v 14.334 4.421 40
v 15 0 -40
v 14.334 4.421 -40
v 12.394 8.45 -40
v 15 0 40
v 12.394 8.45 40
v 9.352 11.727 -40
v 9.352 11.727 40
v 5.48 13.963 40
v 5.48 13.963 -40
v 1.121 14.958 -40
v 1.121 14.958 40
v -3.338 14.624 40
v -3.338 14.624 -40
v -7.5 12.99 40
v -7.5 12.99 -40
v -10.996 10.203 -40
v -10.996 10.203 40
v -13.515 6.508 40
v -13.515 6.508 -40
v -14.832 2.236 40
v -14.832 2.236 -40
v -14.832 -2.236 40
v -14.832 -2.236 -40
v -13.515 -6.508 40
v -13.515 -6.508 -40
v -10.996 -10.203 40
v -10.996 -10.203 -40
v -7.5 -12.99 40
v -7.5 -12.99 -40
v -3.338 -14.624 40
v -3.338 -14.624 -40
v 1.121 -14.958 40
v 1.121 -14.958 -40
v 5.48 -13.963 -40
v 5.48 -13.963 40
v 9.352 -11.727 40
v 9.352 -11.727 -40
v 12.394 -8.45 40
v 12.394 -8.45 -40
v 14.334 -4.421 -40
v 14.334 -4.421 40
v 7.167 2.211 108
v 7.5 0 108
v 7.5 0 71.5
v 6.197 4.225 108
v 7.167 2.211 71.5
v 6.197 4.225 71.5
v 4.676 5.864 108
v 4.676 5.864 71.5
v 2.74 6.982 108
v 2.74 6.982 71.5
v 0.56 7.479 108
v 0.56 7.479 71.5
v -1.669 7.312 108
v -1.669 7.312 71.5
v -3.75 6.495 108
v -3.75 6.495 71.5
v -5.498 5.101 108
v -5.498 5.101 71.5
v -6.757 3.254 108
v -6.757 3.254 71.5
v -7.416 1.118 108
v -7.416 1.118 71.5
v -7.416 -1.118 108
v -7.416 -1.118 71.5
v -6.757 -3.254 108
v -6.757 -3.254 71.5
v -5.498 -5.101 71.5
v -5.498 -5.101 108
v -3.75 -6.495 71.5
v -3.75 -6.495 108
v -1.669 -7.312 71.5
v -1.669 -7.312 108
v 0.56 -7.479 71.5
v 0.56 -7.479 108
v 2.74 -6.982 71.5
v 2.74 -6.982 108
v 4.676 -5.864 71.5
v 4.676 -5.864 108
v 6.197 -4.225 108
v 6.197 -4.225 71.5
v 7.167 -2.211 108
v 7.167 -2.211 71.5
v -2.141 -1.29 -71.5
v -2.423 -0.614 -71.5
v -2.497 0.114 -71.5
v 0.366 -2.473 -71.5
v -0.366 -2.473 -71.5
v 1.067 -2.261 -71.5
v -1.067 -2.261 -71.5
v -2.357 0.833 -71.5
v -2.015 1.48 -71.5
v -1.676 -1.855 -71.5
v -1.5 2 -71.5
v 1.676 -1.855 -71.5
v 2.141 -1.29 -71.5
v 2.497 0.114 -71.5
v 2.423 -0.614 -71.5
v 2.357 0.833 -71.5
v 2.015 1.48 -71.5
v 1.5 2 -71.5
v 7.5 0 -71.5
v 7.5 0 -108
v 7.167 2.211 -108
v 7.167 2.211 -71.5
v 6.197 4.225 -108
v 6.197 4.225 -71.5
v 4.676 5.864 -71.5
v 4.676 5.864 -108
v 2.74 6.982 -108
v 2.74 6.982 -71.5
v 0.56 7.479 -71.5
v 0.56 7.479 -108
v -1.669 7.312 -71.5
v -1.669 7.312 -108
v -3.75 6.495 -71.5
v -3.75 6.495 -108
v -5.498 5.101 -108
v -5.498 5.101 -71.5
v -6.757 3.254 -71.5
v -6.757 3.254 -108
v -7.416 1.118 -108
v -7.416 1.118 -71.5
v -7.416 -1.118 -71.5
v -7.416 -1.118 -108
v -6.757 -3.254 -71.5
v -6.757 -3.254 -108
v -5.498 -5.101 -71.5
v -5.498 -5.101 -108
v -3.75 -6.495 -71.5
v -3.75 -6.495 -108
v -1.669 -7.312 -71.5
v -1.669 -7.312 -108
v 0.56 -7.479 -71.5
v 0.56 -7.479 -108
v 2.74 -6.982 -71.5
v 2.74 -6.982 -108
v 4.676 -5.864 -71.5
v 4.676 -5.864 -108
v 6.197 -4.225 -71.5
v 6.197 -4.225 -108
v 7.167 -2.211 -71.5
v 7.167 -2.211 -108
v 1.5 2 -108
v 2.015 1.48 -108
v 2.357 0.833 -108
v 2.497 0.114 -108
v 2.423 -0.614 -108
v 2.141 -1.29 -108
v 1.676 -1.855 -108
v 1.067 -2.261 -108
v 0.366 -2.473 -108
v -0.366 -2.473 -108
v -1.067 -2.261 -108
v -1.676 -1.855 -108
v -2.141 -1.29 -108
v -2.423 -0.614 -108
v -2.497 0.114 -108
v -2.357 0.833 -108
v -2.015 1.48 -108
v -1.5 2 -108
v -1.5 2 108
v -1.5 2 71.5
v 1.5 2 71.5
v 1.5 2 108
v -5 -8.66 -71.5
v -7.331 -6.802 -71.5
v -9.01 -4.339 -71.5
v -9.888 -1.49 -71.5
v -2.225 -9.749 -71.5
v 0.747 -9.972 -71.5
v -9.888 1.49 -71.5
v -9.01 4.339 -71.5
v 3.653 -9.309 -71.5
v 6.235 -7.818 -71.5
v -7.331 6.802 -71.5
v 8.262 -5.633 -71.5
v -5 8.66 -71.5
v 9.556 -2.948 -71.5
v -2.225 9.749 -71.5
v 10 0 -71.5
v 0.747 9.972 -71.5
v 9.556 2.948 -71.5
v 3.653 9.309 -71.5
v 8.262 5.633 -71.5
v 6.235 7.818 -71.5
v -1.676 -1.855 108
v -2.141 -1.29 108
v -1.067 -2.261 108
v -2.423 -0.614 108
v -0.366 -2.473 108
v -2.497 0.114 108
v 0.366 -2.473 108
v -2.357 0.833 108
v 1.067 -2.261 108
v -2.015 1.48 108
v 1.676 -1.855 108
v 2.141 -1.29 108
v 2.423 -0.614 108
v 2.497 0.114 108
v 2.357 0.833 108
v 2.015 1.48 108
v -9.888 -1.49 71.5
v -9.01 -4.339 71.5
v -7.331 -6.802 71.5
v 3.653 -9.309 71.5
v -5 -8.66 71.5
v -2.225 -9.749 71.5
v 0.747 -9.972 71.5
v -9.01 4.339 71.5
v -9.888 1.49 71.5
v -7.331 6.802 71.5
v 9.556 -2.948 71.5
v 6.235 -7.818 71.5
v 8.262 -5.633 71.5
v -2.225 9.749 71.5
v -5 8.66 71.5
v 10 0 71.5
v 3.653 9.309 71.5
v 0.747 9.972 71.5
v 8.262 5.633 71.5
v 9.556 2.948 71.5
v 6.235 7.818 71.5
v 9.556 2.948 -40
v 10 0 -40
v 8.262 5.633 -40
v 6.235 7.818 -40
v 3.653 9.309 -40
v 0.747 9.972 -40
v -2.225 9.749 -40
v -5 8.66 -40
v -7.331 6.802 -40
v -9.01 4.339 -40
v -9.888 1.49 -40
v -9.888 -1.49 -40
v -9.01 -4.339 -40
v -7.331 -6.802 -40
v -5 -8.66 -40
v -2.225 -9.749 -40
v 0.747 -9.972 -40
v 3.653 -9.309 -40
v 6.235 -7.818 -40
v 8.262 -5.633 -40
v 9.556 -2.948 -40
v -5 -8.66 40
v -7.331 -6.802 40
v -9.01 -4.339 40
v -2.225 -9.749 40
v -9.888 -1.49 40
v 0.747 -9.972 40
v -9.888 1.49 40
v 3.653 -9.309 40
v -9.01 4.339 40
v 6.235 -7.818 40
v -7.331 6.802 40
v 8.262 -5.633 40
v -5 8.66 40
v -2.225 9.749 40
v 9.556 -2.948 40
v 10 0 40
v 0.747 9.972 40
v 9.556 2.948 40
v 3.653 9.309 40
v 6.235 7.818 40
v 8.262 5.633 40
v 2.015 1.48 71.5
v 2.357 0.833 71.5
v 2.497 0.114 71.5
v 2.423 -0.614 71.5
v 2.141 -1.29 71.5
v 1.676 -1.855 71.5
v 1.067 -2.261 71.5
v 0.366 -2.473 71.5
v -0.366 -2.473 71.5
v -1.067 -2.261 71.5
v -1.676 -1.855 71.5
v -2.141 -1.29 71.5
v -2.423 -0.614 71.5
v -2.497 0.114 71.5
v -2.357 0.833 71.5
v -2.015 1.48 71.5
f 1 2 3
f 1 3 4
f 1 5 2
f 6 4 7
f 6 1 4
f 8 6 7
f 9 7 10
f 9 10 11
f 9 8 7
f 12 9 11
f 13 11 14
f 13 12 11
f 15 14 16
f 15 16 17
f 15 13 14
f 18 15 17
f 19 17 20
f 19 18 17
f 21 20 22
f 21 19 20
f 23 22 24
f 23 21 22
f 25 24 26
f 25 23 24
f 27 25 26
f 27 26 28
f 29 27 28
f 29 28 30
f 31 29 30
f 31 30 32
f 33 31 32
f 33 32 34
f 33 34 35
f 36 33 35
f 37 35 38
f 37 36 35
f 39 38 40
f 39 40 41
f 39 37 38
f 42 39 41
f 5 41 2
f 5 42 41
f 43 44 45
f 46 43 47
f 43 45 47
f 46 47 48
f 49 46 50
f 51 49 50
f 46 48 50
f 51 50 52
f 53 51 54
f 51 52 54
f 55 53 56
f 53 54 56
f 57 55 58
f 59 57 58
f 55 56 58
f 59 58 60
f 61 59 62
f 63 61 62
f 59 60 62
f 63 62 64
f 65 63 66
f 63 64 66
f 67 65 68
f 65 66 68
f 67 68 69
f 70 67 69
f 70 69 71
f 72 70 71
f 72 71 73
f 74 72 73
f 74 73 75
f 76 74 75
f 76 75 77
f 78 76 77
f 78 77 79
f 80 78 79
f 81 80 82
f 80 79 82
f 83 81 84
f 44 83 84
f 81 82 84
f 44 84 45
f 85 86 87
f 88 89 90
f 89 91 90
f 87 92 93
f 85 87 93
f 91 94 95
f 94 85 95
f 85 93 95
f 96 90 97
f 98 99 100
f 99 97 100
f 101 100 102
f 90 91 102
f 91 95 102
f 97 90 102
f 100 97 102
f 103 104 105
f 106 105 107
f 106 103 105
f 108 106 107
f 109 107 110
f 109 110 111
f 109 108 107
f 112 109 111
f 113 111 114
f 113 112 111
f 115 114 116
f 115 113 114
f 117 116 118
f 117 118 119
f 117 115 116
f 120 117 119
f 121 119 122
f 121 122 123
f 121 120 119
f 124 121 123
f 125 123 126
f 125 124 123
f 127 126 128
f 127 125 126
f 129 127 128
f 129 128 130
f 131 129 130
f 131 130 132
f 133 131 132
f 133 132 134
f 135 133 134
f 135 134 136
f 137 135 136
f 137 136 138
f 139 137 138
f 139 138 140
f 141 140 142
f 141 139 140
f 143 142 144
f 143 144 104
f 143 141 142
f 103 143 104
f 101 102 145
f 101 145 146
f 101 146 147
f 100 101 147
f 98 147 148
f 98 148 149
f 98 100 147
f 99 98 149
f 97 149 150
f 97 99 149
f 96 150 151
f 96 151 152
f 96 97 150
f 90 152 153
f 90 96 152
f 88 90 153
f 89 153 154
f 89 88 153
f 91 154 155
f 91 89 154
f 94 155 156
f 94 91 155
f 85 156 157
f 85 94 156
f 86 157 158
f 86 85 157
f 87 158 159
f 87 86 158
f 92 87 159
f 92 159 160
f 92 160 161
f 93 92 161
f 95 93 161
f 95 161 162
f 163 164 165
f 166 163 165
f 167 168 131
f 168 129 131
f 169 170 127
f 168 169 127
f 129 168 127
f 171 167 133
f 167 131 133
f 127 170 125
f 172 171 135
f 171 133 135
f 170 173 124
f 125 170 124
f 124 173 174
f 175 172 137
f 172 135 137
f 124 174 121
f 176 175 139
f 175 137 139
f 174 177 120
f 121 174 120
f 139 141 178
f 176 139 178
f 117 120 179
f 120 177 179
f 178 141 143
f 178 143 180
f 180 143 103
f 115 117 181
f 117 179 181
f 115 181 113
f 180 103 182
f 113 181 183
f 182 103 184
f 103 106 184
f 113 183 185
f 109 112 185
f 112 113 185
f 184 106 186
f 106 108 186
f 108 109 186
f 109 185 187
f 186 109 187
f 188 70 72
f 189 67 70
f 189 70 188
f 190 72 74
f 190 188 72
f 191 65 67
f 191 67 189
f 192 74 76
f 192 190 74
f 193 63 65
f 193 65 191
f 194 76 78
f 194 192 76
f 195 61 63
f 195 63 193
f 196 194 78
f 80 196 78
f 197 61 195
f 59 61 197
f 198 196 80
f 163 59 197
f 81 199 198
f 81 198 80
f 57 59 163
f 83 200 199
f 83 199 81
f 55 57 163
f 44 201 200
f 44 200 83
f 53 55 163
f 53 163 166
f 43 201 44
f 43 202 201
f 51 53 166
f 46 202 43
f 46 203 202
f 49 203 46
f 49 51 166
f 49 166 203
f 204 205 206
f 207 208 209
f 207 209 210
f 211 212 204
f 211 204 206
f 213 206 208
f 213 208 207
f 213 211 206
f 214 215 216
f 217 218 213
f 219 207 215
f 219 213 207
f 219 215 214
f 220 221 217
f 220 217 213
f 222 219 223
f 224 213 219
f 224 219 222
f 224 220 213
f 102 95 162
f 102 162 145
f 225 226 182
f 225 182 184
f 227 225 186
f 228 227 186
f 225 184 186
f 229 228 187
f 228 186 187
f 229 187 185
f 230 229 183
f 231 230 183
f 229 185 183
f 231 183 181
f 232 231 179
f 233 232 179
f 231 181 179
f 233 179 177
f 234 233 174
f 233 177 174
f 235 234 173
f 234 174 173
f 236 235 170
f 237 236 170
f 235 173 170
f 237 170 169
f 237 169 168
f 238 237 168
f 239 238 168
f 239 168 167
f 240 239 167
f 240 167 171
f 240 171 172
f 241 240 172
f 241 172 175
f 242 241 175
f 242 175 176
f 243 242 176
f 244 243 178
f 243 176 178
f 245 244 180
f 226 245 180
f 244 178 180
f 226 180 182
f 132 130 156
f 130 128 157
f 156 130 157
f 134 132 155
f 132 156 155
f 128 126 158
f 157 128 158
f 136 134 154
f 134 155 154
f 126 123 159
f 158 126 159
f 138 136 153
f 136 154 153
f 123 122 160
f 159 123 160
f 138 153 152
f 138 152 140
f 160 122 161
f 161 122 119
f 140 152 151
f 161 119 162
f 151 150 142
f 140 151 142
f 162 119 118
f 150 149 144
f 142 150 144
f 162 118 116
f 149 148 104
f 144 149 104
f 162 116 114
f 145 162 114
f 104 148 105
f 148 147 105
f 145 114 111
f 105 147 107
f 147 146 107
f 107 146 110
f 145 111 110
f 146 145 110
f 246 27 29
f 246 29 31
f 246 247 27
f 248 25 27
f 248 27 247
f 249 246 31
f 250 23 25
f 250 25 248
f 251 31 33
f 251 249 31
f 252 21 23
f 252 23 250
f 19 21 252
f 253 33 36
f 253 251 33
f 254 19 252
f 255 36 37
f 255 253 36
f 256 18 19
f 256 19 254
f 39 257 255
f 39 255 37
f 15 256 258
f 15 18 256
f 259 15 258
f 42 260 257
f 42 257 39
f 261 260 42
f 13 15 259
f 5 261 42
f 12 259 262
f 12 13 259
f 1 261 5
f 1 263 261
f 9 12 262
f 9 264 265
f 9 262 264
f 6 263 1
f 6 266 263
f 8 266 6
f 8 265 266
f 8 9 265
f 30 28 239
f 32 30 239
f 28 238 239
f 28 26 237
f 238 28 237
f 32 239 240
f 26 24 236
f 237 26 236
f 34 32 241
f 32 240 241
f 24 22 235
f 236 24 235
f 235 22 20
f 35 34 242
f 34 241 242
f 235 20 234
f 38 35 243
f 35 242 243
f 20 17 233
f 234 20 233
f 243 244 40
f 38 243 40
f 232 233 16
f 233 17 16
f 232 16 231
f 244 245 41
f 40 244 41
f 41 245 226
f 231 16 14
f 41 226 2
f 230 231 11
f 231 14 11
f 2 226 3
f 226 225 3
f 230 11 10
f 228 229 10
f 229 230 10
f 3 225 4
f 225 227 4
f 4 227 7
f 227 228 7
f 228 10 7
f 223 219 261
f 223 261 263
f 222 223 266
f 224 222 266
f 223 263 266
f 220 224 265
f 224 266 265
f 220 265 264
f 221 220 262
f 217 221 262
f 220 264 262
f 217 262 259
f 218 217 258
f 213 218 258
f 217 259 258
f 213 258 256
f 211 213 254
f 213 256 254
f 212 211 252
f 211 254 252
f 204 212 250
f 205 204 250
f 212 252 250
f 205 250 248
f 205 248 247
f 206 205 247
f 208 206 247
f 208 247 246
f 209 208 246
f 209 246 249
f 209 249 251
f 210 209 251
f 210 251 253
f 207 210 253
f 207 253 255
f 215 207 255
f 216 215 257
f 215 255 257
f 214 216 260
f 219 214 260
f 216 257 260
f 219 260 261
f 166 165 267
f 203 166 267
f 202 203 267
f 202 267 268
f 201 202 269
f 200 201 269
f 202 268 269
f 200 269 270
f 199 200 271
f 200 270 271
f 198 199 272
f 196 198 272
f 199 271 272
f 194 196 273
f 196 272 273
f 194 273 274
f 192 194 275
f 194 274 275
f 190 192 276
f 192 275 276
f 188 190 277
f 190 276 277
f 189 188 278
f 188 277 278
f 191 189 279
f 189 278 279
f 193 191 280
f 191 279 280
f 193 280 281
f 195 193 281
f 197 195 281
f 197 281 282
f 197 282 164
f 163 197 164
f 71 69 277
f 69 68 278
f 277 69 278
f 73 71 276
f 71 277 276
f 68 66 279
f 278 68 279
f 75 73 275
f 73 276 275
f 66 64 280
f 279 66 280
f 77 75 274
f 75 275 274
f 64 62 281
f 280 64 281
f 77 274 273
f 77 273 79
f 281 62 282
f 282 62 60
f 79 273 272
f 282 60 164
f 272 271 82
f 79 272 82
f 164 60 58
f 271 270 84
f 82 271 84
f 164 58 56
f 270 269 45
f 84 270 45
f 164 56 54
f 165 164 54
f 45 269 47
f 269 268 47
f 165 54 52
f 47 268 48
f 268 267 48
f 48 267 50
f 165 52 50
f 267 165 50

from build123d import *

# Parameters (mm, degrees)
ESQUISSE1_R        = 15
BOSS_EXTRU_1_DEPTH = 40
BOSS_EXTRU_5_START = 40
ESQUISSE1_10_R     = 10
BOSS_EXTRU_5_DEPTH = 31.5
BOSS_EXTRU_3_START = 71.5
ESQUISSE1_7_R      = 7.5
BOSS_EXTRU_3_DEPTH = 36.5
BOSS_EXTRU_4_START = -71.5
ESQUISSE1_8_R      = 7.5
BOSS_EXTRU_4_DEPTH = 36.5
BOSS_EXTRU_6_START = -71.5
ESQUISSE1_11_R     = 10
BOSS_EXTRU_6_DEPTH = 31.5


with BuildPart() as part:
    # Esquisse1 → Boss.-Extru.1 (new, symmetric)
    with BuildSketch(Plane.XY):
        Circle(ESQUISSE1_R)
    extrude(amount=BOSS_EXTRU_1_DEPTH, both=True)

    # Esquisse1<10> → Boss.-Extru.5 (add)
    with BuildSketch(Plane.XY.offset(BOSS_EXTRU_5_START)):
        Circle(ESQUISSE1_10_R)
    extrude(amount=BOSS_EXTRU_5_DEPTH)



with BuildPart() as body_2:
    # Esquisse1<7> → Boss.-Extru.3 (new body)
    with BuildSketch(Plane.XY.offset(BOSS_EXTRU_3_START)):
        Circle(ESQUISSE1_7_R)
        with BuildLine():
            Line((-1.5, 2), (1.5, 2))
            ThreePointArc((1.5, 2), (0, -2.5), (-1.5, 2))
        make_face(mode=Mode.SUBTRACT)
    extrude(amount=BOSS_EXTRU_3_DEPTH)


with BuildPart() as body_3:
    # Esquisse1<8> → Boss.-Extru.4 (new body)
    with BuildSketch(Plane.XY.offset(BOSS_EXTRU_4_START)):
        Circle(ESQUISSE1_8_R)
        with BuildLine():
            Line((-1.5, 2), (1.5, 2))
            ThreePointArc((1.5, 2), (0, -2.5), (-1.5, 2))
        make_face(mode=Mode.SUBTRACT)
    extrude(amount=-BOSS_EXTRU_4_DEPTH)


with BuildPart() as part_1:
    add(part.part)

    add(body_3.part)  # Boss.-Extru.6 merges body 3
    # Esquisse1<11> → Boss.-Extru.6 (add)
    with BuildSketch(Plane.XY.offset(BOSS_EXTRU_6_START)):
        Circle(ESQUISSE1_11_R)
    extrude(amount=BOSS_EXTRU_6_DEPTH)


solid = Compound([body_2.part, part_1.part])
